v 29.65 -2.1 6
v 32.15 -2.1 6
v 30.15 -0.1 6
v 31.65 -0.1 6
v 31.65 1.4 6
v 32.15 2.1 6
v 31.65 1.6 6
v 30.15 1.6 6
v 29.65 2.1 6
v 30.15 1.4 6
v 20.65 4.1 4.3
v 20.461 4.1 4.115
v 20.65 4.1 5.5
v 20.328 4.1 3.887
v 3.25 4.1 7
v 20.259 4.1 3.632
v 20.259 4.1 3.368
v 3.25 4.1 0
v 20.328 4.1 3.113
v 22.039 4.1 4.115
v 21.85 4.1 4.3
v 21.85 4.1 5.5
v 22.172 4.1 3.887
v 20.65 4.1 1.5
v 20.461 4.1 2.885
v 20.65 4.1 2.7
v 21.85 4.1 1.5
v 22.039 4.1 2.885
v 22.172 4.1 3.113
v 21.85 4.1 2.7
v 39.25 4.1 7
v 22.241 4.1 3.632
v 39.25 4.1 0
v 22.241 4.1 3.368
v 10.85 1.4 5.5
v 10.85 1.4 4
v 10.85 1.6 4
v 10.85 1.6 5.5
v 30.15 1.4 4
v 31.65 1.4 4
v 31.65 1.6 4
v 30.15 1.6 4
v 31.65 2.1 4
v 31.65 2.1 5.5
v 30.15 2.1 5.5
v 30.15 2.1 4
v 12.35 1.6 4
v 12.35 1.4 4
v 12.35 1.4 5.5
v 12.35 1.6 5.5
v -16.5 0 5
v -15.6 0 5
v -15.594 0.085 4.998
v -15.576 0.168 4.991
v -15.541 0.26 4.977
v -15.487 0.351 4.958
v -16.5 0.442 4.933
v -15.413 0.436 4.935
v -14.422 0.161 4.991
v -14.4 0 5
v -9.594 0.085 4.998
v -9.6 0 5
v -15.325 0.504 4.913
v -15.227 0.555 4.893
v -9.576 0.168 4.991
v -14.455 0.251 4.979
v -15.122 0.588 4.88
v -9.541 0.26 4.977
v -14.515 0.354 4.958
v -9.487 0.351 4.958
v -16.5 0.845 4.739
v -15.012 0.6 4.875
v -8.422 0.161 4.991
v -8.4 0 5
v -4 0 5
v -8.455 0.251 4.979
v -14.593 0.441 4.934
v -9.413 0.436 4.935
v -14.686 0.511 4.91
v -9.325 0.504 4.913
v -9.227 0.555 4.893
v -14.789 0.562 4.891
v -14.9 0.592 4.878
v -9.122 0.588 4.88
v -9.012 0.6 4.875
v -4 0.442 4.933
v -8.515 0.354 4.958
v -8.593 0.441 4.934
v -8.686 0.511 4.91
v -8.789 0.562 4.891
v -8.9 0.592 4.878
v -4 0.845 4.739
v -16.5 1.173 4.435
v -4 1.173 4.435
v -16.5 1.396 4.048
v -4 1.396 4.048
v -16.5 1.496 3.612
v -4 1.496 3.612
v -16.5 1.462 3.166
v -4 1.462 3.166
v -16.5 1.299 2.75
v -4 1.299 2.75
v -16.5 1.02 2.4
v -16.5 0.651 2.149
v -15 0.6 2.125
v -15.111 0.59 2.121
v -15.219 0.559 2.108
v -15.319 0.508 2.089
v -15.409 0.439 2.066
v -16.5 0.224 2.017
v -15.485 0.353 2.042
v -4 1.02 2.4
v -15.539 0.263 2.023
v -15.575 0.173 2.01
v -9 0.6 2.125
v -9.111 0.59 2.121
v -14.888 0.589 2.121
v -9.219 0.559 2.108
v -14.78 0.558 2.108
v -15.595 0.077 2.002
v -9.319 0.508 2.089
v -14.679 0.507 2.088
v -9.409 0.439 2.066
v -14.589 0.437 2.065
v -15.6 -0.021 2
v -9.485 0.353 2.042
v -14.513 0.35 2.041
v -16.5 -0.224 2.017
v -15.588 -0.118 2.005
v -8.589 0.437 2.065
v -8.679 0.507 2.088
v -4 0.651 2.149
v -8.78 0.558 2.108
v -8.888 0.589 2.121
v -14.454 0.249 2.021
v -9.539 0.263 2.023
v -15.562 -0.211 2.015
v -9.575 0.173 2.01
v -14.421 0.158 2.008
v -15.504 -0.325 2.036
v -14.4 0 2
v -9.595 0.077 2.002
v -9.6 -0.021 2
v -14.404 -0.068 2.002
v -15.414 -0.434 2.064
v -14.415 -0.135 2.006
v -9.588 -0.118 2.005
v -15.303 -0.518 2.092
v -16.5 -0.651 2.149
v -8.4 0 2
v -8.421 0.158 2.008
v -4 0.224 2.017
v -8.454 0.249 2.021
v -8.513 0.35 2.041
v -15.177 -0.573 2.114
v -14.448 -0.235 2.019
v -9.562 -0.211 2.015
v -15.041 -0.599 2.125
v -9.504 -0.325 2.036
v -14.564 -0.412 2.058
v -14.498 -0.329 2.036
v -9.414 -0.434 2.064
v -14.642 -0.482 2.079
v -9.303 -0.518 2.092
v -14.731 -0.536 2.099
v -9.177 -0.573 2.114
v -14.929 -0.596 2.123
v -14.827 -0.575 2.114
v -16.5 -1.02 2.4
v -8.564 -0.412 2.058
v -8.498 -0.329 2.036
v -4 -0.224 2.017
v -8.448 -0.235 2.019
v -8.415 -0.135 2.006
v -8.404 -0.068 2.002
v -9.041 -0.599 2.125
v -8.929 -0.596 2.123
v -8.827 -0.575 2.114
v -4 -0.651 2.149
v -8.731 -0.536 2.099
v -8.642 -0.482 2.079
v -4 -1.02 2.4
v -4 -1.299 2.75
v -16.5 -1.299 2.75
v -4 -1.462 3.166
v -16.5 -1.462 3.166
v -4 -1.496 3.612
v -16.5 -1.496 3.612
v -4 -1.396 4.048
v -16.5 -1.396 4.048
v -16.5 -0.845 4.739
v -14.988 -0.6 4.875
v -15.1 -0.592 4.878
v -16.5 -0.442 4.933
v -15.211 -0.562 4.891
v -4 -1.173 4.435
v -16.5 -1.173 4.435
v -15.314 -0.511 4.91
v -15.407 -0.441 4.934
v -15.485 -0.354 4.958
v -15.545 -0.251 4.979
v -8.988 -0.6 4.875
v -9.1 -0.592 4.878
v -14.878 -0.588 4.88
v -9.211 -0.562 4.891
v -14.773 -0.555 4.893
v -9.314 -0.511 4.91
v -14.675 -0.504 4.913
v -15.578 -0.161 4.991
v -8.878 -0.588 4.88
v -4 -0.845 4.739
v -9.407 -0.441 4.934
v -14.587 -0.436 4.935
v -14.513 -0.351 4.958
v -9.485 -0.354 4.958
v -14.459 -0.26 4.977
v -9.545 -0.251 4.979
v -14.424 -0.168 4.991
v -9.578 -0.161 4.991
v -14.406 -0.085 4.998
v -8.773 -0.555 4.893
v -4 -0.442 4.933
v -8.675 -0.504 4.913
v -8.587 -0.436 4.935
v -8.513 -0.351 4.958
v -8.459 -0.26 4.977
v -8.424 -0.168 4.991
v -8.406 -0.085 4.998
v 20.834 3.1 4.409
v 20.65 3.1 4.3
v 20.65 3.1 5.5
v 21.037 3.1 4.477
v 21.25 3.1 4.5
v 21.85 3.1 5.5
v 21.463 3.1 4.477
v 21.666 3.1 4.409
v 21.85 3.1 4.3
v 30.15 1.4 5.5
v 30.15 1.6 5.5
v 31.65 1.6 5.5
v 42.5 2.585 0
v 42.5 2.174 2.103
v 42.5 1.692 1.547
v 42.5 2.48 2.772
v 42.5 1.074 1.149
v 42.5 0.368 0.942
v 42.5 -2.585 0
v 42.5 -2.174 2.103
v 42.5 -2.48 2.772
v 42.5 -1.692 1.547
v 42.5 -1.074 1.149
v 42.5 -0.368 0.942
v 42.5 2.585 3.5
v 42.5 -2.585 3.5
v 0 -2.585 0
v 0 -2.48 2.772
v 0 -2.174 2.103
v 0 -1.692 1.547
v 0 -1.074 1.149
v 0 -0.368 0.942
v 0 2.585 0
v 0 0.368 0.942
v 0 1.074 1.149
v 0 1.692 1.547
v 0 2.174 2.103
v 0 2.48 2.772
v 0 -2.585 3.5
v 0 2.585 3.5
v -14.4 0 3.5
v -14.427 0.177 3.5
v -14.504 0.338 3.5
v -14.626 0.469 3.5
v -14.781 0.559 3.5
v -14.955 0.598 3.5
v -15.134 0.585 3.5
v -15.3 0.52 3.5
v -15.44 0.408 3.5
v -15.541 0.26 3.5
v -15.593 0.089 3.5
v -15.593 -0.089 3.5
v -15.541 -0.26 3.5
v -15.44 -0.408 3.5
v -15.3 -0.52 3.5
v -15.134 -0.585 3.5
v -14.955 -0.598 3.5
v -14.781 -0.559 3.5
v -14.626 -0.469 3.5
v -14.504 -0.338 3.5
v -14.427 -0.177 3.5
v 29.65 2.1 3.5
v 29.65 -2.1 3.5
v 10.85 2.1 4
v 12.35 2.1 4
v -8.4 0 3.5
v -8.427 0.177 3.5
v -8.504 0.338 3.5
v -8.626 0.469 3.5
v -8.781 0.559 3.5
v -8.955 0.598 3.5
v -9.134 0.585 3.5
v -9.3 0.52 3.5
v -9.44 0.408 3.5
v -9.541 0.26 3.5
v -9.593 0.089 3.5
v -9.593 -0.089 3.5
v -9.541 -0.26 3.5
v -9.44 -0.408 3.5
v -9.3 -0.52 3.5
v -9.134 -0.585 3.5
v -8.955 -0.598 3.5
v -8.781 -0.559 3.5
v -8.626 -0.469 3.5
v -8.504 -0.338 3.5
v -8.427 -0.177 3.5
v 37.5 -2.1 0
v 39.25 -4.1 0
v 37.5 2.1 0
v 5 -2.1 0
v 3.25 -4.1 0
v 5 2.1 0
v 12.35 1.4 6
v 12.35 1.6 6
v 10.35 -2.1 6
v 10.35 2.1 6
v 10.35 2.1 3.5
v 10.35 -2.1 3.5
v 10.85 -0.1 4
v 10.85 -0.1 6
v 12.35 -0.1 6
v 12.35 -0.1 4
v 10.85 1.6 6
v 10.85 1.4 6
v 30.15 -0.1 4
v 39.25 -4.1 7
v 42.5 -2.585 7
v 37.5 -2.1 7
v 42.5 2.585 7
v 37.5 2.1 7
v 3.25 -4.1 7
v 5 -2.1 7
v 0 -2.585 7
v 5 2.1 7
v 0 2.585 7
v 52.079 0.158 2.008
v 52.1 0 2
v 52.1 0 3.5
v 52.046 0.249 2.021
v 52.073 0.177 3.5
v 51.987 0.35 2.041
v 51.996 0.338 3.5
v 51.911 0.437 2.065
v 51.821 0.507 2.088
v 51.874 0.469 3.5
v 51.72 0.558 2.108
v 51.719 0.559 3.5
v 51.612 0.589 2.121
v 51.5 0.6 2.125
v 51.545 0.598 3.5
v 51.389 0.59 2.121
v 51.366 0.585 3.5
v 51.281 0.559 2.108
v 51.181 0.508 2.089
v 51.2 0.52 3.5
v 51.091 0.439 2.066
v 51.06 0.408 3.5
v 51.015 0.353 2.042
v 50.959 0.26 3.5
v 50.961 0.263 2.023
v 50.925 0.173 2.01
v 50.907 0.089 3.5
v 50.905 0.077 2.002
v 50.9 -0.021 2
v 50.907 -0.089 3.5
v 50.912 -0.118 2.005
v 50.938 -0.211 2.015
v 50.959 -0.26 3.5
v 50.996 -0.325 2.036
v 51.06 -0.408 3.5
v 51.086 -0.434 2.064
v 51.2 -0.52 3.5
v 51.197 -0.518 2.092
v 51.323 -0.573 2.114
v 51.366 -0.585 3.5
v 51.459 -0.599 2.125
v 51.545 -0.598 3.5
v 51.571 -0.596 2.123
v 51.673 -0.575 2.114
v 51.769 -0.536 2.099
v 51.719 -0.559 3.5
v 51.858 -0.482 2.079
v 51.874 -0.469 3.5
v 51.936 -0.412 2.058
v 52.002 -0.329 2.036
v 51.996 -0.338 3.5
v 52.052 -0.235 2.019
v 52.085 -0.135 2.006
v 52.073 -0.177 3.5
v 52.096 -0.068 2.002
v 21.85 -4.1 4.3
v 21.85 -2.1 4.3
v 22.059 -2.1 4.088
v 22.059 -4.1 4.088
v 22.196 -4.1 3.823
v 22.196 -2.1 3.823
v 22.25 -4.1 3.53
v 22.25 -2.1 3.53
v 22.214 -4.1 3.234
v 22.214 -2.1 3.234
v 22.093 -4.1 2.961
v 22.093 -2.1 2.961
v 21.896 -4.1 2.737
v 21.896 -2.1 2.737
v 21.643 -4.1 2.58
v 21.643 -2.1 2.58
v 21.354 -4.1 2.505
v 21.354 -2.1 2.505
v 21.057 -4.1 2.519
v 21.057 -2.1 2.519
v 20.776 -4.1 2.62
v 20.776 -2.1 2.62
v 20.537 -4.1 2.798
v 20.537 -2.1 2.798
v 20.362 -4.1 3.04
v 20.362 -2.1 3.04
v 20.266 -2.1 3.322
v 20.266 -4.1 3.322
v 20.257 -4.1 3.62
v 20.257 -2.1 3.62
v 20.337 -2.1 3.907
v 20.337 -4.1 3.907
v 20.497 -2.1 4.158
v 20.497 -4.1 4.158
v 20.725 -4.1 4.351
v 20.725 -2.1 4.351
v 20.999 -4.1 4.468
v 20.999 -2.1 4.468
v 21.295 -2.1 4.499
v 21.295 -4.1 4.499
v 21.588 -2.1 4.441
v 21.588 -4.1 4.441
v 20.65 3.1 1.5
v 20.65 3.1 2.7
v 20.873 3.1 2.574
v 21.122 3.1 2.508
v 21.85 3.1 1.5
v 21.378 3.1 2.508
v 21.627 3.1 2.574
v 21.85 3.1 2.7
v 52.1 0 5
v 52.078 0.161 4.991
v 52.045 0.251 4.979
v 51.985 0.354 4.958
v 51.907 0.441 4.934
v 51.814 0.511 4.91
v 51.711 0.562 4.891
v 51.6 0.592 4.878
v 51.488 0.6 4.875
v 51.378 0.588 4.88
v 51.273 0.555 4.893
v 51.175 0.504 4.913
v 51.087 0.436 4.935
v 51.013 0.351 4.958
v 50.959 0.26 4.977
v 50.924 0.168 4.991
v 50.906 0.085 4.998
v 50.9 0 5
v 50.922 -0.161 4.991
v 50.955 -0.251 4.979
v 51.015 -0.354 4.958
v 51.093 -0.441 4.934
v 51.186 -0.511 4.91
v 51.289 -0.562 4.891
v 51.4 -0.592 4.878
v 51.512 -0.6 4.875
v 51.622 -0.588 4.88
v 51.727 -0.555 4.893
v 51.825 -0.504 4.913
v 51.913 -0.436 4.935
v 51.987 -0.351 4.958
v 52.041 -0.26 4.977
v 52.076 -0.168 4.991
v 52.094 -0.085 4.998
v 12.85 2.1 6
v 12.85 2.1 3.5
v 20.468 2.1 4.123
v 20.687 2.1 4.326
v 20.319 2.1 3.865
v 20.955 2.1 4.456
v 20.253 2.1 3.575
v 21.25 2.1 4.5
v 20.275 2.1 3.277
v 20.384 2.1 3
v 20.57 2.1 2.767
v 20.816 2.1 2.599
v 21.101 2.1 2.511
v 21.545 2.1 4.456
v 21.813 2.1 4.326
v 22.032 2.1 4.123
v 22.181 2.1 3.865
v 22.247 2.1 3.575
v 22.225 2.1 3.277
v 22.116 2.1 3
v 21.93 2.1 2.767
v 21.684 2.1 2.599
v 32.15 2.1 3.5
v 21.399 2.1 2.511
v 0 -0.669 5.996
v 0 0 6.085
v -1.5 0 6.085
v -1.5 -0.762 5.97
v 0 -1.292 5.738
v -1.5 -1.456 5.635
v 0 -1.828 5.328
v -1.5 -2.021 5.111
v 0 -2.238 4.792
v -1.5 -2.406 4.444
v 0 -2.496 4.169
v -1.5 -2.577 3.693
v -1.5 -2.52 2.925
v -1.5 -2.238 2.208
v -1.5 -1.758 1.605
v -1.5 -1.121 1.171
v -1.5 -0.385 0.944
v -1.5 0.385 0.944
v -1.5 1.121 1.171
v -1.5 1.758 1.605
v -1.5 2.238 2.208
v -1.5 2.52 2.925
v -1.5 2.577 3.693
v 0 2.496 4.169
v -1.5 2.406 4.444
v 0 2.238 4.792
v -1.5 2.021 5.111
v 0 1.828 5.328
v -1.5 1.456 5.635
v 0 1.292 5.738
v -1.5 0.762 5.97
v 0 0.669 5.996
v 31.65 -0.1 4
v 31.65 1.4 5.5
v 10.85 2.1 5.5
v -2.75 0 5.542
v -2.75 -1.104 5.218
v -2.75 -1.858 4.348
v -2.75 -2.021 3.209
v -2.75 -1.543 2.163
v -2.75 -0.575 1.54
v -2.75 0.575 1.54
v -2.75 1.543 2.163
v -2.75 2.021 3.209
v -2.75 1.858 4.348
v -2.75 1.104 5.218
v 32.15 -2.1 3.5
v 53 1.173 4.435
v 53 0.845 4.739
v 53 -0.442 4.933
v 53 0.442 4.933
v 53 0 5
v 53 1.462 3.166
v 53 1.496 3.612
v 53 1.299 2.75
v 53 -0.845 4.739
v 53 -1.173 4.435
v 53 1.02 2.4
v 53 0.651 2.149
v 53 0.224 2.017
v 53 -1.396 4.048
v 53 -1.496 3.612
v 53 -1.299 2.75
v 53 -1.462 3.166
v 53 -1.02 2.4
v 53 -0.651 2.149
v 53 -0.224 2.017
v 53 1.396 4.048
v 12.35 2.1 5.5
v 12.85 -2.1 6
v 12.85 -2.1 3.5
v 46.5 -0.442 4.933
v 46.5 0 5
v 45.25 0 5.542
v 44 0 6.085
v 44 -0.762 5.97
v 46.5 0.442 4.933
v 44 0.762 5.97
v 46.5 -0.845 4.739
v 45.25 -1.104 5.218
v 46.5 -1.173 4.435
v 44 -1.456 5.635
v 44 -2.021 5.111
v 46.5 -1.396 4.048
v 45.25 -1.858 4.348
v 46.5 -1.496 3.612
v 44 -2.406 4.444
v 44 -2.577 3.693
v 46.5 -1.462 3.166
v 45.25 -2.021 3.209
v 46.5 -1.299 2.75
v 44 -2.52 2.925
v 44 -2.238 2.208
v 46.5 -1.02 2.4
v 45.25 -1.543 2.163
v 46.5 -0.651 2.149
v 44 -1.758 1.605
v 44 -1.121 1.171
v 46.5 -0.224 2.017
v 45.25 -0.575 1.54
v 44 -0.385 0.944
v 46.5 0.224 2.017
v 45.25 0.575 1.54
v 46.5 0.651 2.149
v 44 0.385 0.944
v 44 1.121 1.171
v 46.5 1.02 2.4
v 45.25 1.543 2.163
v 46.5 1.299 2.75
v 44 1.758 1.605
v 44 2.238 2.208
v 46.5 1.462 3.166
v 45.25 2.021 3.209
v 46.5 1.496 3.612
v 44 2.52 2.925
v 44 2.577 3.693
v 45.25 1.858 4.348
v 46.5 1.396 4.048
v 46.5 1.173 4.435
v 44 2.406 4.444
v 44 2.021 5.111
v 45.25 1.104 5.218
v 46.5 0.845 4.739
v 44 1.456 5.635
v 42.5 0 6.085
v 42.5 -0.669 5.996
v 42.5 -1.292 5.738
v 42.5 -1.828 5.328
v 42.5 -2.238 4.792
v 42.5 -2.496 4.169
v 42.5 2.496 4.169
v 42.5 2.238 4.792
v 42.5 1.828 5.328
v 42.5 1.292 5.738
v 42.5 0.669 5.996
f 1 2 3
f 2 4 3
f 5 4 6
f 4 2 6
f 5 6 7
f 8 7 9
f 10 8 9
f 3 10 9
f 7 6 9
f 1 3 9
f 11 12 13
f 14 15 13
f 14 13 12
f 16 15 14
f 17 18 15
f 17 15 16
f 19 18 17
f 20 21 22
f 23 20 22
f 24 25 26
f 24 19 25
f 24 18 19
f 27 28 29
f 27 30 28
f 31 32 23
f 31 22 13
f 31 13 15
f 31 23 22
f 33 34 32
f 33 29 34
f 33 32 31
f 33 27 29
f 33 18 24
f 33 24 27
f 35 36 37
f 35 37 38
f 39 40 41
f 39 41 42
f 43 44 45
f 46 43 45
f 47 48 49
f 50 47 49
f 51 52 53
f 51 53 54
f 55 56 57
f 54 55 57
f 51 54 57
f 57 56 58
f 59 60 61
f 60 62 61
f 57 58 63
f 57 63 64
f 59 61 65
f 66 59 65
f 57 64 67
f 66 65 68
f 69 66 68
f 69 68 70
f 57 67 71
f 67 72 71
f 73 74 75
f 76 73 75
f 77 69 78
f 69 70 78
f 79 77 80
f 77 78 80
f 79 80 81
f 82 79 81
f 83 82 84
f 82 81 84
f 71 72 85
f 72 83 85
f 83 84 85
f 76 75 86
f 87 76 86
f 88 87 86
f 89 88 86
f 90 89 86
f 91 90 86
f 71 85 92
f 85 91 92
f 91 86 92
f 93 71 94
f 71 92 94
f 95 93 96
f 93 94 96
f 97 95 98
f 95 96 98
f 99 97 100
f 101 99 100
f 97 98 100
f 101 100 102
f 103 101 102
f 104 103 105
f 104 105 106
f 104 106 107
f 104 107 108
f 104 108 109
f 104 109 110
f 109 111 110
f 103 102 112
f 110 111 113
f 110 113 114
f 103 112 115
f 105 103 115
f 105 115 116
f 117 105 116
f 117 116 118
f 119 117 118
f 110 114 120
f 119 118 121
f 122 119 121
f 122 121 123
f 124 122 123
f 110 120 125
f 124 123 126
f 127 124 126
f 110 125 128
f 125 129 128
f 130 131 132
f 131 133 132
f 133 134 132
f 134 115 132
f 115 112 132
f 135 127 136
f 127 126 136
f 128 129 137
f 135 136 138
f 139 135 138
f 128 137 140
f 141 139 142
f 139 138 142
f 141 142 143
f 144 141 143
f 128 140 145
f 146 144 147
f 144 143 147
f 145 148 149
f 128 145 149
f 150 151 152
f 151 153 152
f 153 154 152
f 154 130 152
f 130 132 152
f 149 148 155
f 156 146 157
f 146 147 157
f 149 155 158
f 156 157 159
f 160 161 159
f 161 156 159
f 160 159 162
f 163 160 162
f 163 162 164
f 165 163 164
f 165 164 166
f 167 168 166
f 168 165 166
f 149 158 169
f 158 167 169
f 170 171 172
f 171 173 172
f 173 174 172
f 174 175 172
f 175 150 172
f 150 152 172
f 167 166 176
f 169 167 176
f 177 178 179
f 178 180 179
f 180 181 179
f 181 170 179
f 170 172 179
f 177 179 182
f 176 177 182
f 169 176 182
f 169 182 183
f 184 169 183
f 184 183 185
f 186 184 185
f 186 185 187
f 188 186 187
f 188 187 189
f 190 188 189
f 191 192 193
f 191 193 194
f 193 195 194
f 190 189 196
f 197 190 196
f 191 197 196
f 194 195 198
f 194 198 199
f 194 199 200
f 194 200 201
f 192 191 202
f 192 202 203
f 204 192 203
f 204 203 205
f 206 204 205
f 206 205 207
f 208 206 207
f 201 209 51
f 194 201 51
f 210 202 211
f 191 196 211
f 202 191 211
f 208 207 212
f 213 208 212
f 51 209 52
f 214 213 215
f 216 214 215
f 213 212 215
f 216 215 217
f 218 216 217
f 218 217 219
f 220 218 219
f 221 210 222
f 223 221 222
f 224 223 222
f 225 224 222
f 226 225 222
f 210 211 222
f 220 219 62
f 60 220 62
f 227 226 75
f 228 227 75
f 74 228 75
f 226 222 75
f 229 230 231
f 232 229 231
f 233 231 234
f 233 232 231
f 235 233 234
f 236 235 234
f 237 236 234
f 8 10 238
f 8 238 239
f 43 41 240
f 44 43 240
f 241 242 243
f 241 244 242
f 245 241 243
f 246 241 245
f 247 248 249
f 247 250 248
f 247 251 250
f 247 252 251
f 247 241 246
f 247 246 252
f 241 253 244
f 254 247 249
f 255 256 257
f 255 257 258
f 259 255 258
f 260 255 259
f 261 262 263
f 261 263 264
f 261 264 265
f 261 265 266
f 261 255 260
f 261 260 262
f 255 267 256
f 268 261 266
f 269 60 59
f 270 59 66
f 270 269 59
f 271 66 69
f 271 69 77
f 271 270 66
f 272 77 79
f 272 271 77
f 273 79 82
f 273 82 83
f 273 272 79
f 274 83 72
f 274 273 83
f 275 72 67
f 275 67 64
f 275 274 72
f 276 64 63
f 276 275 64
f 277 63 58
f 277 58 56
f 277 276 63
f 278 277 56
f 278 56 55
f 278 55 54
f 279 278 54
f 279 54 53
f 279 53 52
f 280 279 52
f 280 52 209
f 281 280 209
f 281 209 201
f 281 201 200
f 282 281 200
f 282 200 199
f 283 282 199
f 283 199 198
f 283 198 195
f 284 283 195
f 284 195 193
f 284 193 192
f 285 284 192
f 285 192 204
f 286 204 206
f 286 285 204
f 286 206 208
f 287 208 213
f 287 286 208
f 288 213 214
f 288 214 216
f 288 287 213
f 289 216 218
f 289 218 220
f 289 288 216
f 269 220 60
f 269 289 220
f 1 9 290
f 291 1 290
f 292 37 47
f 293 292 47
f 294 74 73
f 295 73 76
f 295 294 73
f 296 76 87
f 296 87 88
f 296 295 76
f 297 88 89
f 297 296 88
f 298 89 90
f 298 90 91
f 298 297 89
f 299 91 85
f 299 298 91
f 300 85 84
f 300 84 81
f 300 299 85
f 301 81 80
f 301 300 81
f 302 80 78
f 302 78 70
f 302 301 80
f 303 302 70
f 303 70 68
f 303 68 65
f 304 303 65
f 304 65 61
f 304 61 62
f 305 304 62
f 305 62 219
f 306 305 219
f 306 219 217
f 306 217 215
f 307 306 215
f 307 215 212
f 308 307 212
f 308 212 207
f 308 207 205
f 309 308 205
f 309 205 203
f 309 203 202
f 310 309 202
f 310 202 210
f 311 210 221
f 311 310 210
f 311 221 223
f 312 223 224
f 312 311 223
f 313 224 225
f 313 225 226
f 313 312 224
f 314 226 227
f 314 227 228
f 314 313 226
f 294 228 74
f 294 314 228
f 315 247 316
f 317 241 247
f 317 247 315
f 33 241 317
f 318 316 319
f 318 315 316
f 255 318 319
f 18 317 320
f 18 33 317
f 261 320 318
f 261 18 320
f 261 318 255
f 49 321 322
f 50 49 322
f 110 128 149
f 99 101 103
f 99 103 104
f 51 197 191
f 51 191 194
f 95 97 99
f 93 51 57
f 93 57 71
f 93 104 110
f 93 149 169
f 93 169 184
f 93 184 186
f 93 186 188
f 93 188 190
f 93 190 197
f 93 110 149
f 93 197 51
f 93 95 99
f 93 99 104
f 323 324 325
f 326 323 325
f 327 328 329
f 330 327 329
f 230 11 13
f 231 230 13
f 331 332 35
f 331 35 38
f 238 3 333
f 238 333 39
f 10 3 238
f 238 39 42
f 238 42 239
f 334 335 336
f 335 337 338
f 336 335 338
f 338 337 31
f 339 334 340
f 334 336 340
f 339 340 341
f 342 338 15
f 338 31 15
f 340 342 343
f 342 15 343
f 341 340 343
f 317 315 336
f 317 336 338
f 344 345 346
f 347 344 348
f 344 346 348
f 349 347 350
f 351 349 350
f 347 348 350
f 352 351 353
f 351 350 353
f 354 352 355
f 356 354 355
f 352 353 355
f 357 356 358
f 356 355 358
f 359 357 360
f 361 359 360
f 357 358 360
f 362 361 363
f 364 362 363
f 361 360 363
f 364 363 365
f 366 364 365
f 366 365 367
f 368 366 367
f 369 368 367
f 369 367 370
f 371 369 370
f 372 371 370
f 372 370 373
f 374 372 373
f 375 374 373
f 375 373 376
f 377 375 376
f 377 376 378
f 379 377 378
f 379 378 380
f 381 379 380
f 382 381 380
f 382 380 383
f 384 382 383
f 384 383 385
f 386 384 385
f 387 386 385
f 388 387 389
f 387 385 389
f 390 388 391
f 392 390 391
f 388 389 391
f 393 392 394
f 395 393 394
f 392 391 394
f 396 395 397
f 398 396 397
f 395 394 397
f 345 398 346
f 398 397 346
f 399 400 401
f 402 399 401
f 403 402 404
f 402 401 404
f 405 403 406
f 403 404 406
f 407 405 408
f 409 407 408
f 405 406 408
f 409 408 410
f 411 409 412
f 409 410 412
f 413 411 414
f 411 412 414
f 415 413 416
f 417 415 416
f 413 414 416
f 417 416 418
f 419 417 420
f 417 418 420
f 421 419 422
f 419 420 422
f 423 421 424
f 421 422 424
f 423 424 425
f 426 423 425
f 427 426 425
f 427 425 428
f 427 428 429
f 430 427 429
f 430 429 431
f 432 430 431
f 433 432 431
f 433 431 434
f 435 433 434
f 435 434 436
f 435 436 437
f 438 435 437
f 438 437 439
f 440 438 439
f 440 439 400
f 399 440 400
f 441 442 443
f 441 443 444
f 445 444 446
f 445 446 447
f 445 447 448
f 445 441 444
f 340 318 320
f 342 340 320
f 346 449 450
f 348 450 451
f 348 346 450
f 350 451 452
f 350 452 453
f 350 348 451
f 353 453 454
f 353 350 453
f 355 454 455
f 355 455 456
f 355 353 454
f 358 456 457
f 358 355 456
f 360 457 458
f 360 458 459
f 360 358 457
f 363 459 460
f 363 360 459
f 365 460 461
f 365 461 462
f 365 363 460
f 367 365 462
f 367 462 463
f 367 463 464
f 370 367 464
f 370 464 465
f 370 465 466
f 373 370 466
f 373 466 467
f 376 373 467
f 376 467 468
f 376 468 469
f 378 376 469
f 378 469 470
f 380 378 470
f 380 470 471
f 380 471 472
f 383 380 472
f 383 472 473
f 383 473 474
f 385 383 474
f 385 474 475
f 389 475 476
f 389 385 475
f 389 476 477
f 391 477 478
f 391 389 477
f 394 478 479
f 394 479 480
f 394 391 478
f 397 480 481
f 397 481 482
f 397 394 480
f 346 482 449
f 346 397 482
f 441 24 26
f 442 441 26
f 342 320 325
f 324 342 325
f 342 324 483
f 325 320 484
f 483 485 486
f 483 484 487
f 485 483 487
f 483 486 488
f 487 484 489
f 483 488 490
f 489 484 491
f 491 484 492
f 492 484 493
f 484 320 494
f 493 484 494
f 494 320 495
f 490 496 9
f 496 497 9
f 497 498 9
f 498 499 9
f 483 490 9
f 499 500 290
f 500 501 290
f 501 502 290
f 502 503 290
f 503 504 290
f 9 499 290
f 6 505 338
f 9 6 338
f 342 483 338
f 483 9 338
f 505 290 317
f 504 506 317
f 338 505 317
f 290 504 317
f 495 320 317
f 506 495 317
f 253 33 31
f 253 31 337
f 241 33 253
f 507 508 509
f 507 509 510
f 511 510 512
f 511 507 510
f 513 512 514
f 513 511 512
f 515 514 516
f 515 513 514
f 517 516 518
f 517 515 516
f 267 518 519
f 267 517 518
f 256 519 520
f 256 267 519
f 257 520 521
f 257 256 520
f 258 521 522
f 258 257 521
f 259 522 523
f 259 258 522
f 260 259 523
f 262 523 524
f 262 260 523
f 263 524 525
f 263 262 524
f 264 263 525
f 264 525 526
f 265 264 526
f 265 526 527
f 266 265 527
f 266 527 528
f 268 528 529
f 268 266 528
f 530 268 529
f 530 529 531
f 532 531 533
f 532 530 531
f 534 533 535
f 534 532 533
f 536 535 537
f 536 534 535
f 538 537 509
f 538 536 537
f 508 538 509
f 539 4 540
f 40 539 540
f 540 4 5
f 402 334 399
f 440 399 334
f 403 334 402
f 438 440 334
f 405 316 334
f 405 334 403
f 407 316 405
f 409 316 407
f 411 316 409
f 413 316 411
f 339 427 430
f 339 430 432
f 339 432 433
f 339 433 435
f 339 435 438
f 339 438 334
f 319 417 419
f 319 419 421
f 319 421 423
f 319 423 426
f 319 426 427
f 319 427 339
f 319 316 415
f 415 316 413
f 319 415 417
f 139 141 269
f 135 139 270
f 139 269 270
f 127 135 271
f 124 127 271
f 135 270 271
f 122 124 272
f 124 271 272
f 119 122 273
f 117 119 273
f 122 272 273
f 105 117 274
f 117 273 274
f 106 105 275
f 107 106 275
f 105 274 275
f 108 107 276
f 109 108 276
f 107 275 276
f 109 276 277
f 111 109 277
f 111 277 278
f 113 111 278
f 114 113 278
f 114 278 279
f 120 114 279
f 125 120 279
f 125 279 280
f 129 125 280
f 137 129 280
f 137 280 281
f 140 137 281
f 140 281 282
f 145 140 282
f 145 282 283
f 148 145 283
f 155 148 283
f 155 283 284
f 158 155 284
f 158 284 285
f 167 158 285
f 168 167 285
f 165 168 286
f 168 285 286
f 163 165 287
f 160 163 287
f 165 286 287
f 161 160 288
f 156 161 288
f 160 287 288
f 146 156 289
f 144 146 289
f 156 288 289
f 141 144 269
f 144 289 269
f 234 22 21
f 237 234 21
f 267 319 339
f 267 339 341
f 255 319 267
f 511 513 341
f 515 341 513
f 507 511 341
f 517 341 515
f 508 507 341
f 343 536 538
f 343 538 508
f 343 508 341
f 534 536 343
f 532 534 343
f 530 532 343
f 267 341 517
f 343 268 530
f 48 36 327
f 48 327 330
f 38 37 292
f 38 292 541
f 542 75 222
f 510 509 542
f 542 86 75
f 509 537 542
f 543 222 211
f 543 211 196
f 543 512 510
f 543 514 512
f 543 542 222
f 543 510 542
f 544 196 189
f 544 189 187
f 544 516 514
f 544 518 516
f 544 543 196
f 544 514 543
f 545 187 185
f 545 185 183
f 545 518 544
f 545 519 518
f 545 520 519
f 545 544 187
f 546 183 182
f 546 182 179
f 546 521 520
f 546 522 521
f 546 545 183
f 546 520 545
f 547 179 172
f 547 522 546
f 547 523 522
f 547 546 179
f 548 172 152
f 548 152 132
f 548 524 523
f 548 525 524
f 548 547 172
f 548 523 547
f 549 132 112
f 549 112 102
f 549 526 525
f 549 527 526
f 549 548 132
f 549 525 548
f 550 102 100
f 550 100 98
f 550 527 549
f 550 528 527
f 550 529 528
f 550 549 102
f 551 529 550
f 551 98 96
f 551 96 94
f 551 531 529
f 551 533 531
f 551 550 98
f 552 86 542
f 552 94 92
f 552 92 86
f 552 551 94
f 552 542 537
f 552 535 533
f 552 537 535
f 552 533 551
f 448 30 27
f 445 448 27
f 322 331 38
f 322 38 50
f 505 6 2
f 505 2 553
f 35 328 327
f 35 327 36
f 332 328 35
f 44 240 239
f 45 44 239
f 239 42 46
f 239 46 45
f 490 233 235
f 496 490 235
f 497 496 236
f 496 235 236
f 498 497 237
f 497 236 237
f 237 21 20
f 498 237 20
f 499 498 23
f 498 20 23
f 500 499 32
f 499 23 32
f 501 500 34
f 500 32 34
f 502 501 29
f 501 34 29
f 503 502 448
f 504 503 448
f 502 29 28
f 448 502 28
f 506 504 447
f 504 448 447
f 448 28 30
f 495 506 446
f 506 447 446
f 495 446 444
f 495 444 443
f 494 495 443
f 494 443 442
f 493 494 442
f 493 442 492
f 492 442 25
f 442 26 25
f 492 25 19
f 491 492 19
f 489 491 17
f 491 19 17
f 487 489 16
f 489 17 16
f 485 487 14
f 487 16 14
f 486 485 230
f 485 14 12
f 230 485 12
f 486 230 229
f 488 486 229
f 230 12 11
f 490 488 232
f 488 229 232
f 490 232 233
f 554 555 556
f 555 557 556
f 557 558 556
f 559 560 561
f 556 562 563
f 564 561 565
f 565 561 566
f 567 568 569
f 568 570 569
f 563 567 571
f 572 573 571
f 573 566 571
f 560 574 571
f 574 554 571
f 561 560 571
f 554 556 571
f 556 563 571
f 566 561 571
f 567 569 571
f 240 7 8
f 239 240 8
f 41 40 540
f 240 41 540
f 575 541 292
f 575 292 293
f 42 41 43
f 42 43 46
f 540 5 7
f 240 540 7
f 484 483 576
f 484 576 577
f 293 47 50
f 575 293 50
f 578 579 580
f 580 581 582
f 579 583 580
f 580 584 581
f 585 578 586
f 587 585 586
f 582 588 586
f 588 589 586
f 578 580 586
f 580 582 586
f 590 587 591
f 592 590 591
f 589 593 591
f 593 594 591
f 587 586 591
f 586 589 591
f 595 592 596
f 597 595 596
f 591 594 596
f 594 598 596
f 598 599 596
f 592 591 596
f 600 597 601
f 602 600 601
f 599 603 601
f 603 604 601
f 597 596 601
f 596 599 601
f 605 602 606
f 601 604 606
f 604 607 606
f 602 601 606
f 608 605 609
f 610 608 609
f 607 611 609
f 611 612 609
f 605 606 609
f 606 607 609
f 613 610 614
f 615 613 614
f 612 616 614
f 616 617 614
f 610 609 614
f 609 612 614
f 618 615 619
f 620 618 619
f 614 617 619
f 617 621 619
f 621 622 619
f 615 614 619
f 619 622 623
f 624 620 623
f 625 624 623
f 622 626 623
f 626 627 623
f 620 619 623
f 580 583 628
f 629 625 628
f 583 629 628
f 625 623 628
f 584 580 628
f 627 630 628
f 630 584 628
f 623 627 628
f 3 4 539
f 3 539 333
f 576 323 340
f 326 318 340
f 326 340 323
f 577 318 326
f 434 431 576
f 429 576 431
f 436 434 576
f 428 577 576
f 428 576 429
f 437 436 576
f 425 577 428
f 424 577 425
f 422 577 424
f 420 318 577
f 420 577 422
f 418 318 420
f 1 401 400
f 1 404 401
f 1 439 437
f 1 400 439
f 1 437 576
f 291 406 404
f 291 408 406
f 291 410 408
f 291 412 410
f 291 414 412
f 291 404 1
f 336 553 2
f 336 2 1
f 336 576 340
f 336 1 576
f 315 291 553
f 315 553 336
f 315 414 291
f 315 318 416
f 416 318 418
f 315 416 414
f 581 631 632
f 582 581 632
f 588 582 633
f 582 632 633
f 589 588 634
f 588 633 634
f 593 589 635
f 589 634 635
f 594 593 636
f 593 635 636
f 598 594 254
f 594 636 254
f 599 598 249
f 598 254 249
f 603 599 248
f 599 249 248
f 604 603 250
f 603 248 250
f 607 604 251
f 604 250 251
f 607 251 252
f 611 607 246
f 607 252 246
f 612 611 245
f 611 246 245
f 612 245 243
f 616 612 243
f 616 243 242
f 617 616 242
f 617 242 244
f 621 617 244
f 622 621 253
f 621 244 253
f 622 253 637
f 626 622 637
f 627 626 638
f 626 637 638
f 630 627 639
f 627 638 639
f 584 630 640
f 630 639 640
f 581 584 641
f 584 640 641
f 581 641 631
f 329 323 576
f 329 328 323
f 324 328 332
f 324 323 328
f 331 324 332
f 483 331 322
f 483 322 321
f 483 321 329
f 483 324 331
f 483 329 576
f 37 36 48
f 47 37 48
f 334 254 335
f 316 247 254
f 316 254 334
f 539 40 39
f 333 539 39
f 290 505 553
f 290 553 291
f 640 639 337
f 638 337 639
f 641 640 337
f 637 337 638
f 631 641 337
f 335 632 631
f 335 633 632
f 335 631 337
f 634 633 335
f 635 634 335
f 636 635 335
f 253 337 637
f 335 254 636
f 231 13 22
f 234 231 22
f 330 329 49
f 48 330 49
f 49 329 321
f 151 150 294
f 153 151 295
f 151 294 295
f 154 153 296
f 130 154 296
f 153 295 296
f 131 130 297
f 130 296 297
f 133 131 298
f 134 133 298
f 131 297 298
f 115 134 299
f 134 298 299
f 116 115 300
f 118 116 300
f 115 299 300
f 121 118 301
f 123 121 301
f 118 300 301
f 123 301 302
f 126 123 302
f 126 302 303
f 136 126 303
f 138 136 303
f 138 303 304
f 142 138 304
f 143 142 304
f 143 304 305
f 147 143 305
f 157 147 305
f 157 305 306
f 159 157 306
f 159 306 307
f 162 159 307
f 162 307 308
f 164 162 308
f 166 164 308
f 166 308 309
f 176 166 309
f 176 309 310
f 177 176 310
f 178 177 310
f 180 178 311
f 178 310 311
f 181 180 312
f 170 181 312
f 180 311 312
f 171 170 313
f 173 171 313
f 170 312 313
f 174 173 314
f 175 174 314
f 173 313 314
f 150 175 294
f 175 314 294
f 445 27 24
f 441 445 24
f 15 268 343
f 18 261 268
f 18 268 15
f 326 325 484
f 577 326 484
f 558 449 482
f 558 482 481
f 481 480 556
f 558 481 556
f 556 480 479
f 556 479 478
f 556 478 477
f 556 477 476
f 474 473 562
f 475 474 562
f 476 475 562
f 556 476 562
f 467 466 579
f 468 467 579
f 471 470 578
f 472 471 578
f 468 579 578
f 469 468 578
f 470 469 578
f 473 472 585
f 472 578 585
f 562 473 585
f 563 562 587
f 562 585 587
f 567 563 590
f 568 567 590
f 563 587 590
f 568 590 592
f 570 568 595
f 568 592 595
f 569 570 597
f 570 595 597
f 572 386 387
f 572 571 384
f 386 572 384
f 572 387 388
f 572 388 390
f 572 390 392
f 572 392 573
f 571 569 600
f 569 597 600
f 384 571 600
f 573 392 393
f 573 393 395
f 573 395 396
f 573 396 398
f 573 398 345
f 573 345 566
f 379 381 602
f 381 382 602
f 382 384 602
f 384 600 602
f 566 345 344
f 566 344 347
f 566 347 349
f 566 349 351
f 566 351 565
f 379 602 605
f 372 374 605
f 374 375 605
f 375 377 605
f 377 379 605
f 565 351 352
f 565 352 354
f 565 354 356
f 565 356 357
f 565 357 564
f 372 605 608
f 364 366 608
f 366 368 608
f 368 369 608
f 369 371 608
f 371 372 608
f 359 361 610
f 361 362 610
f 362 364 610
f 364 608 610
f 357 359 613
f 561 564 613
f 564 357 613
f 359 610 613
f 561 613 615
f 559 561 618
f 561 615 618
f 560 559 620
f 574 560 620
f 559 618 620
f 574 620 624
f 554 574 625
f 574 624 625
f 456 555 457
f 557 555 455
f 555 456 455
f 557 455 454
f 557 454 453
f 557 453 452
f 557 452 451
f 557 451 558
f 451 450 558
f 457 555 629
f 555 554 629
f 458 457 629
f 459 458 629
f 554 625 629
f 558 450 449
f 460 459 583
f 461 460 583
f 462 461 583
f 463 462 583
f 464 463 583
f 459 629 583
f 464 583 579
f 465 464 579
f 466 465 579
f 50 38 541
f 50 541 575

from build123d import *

# Parameters (mm, degrees)
SKETCH1_W                   = 32.5
SKETCH1_H                   = 4.2
BASEFORM_DEPTH              = 7
SKETCH2_R                   = 1
HUMERUSAXLEHOLE1_DEPTH      = 2
HUMERUSAXLELOCK_DEPTH       = 1
SKETCH6_R                   = 1.5
AXLEEXTENSION_DEPTH         = 6
SKETCH7_R                   = 0.6
SCREWHOLES_DEPTH            = 54.273445543
SCREWHOLES_DEPTH_BACK       = 54.273445543
SKETCH8_W                   = 2.5
SKETCH8_H                   = 2.5
HUMERUSTUBEHOLDERBASE_DEPTH = 4.2
SKETCH13_W                  = 1.5
SKETCH13_H                  = 1.5
TUBECLIPENTRANCE_DEPTH      = 2
SKETCH14_W                  = 1.5
SKETCH14_H                  = 1.5
CABLECLIPLOCKSLOT_DEPTH     = 0.7
SKETCH15_W                  = 1.5
SKETCH15_H                  = 0.2
TUBECLIPLOCKCLEARANCE_DEPTH = 2
SKETCH12_R                  = 1
HUMERUSAXLEHOLE2_DEPTH      = 54.818584249


with BuildPart() as part:
    # Sketch1 → BaseForm (new body)
    with BuildSketch(Plane.XY):
        Polygon((0, -2.584500111), (0, 2.584500111), (3.25, 4.1), (39.25, 4.1), (42.5, 2.584500111), (42.5, -2.584500111), (39.25, -4.1), (3.25, -4.1), align=None)
        with Locations((21.25, 0)):
            Rectangle(SKETCH1_W, SKETCH1_H, mode=Mode.SUBTRACT)
    extrude(amount=BASEFORM_DEPTH)

    # Sketch2 → HumerusAxleHole1 (cut)
    with BuildSketch(Plane(origin=(0, 4.1, 0), x_dir=(1, 0, 0), z_dir=(0, 1, 0))):
        with Locations(Location((21.25, -3.5, 0), (0, 0, 270))):
            Circle(SKETCH2_R)
    extrude(amount=-HUMERUSAXLEHOLE1_DEPTH, mode=Mode.SUBTRACT)

    # Sketch2_4 → HumerusAxleLock (cut)
    with BuildSketch(Plane(origin=(0, 4.1, 0), x_dir=(1, 0, 0), z_dir=(0, 1, 0))):
        with BuildLine():
            ThreePointArc((20.65, -2.7), (21.25, -2.5), (21.85, -2.7))
            Line((21.85, -2.7), (21.85, -1.5))
            Line((21.85, -1.5), (20.65, -1.5))
            Line((20.65, -1.5), (20.65, -2.7))
        make_face()
        with BuildLine():
            Line((21.85, -5.5), (21.85, -4.3))
            ThreePointArc((21.85, -4.3), (21.25, -4.5), (20.65, -4.3))
            Line((20.65, -4.3), (20.65, -5.5))
            Line((20.65, -5.5), (21.85, -5.5))
        make_face()
    extrude(amount=-HUMERUSAXLELOCK_DEPTH, mode=Mode.SUBTRACT)

    # Sketch5 → Axle (revolve)
    with BuildSketch(Plane.XY.offset(3.5), mode=Mode.PRIVATE) as axle_sk:
        Polygon((53, 0), (53, 1.5), (46.5, 1.5), (44, 2.584500111), (42.5, 2.584500111), (42.5, 0), align=None)
    axle = revolve(axle_sk.sketch.rotate(Axis((42.5, 0, 3.5), (1, 0, 0)), 90), axis=Axis((42.5, 0, 3.5), (1, 0, 0)))

    # Axle2: Axle across plane
    add(axle.mirror(Plane.ZY.offset(-21.25)))

    # Sketch6 → AxleExtension (add)
    with BuildSketch(Plane.ZY.offset(10.5)):
        with Locations((3.5, 0)):
            Circle(SKETCH6_R)
    extrude(amount=AXLEEXTENSION_DEPTH)

    # Sketch7 → ScrewHoles (cut, two sides)
    with BuildSketch(Plane.XY.offset(3.5)) as screwholes_sk:
        with Locations((-9, 0)):
            Circle(SKETCH7_R)
        with Locations((-15, 0)):
            Circle(SKETCH7_R)
        with Locations((51.5, 0)):
            Circle(SKETCH7_R)
    extrude(amount=SCREWHOLES_DEPTH, mode=Mode.SUBTRACT)
    extrude(screwholes_sk.sketch, amount=-SCREWHOLES_DEPTH_BACK, mode=Mode.SUBTRACT)

    # Sketch8 → HumerusTubeHolderBase (add)
    with BuildSketch(Plane(origin=(0, 2.1, 0), x_dir=(1, 0, 0), z_dir=(0, 1, 0))):
        with Locations((11.6, -4.75)):
            Rectangle(SKETCH8_W, SKETCH8_H)
    humerustubeholderbase = extrude(amount=-HUMERUSTUBEHOLDERBASE_DEPTH)

    # Sketch13 → TubeClipEntrance (cut)
    with BuildSketch(Plane.XY.offset(6)):
        with Locations((11.6, 0.65)):
            Rectangle(SKETCH13_W, SKETCH13_H)
    tubeclipentrance = extrude(amount=-TUBECLIPENTRANCE_DEPTH, mode=Mode.SUBTRACT)

    # Sketch14 → CableClipLockSlot (cut)
    with BuildSketch(Plane.XZ.offset(-1.4)):
        with Locations((11.6, 4.75)):
            Rectangle(SKETCH14_W, SKETCH14_H)
    cablecliplockslot = extrude(amount=-CABLECLIPLOCKSLOT_DEPTH, mode=Mode.SUBTRACT)

    # Sketch15 → TubeClipLockClearance (cut)
    with BuildSketch(Plane.XY.offset(6)):
        with Locations((11.6, 1.5)):
            Rectangle(SKETCH15_W, SKETCH15_H)
    tubecliplockclearance = extrude(amount=-TUBECLIPLOCKCLEARANCE_DEPTH, mode=Mode.SUBTRACT)

    # Sketch12 → HumerusAxleHole2 (cut, through all)
    with BuildSketch(Plane(origin=(0, -2.1, 0), x_dir=(1, 0, 0), z_dir=(0, 1, 0))):
        with Locations(Location((21.25, -3.5, 0), (0, 0, 306.869897646))):
            Circle(SKETCH12_R)
    extrude(amount=-HUMERUSAXLEHOLE2_DEPTH, mode=Mode.SUBTRACT)

    # TubeClipSlot2: HumerusTubeHolderBase, TubeClipEntrance, CableClipLockSlot, TubeClipLockClearance across plane
    add(humerustubeholderbase.mirror(Plane(origin=(21.25, 0, 0), x_dir=(0, 0, 1), z_dir=(1, 0, 0))))
    add(tubeclipentrance.mirror(Plane(origin=(21.25, 0, 0), x_dir=(0, 0, 1), z_dir=(1, 0, 0))), mode=Mode.SUBTRACT)
    add(cablecliplockslot.mirror(Plane(origin=(21.25, 0, 0), x_dir=(0, 0, 1), z_dir=(1, 0, 0))), mode=Mode.SUBTRACT)
    add(tubecliplockclearance.mirror(Plane(origin=(21.25, 0, 0), x_dir=(0, 0, 1), z_dir=(1, 0, 0))), mode=Mode.SUBTRACT)


solid = part.part
